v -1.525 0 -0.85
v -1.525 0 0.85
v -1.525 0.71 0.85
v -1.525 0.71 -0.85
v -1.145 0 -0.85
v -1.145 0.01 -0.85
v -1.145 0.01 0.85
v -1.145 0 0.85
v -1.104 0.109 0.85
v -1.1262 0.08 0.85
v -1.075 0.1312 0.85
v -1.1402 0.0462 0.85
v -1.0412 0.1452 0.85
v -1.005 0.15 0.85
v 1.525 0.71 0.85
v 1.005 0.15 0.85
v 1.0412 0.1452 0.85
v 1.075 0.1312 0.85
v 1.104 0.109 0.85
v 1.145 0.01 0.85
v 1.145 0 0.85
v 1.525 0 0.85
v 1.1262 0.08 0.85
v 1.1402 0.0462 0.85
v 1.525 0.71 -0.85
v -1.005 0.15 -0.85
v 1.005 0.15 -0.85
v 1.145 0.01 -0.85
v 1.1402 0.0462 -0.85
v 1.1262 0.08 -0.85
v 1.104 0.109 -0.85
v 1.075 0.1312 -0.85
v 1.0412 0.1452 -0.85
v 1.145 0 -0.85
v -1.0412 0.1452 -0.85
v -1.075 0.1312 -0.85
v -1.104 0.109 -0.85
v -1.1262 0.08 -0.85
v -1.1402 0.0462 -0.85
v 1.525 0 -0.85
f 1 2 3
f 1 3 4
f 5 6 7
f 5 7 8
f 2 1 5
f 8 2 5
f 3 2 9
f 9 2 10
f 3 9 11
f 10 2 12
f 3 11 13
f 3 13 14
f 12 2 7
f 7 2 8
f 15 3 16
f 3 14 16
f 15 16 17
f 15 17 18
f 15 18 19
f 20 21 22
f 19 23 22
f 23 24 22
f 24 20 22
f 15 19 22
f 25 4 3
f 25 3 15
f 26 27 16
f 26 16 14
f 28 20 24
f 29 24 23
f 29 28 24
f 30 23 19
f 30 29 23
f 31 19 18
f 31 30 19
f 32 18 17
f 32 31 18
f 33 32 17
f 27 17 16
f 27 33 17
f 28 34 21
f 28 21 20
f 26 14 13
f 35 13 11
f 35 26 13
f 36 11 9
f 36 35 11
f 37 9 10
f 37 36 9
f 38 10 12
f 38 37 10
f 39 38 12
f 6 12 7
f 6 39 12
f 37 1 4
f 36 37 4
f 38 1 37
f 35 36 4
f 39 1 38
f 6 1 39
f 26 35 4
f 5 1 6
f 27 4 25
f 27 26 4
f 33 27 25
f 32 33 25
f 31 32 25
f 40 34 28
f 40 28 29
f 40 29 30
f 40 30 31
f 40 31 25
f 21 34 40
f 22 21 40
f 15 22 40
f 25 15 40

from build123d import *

# Parameters (mm, degrees)
SKETCH1_W               = 3.05
SKETCH1_H               = 1.7
BOSS_EXTRUDE1_DEPTH     = 0.71
CUT_EXTRUDE1_DEPTH      = 1.85
CUT_EXTRUDE1_DEPTH_BACK = 1.85


with BuildPart() as part:
    # Sketch1 → Boss-Extrude1 (new body)
    with BuildSketch(Plane(origin=(0, 0, 0), x_dir=(1, 0, 0), z_dir=(0, 1, 0))):
        Rectangle(SKETCH1_W, SKETCH1_H)
    extrude(amount=BOSS_EXTRUDE1_DEPTH)

    # Sketch2 → Cut-Extrude1 (cut, two sides)
    with BuildSketch(Plane.XY) as cut_extrude1_sk:
        with BuildLine():
            Line((-1.145, 0), (1.145, 0))
            Line((1.145, 0), (1.145, 0.01))
            ThreePointArc((1.145, 0.01), (1.103994949, 0.108994949), (1.005, 0.15))
            Line((1.005, 0.15), (-1.005, 0.15))
            ThreePointArc((-1.005, 0.15), (-1.103994949, 0.108994949), (-1.145, 0.01))
            Line((-1.145, 0.01), (-1.145, 0))
        make_face()
    extrude(amount=CUT_EXTRUDE1_DEPTH, mode=Mode.SUBTRACT)
    extrude(cut_extrude1_sk.sketch, amount=-CUT_EXTRUDE1_DEPTH_BACK, mode=Mode.SUBTRACT)


solid = part.part
